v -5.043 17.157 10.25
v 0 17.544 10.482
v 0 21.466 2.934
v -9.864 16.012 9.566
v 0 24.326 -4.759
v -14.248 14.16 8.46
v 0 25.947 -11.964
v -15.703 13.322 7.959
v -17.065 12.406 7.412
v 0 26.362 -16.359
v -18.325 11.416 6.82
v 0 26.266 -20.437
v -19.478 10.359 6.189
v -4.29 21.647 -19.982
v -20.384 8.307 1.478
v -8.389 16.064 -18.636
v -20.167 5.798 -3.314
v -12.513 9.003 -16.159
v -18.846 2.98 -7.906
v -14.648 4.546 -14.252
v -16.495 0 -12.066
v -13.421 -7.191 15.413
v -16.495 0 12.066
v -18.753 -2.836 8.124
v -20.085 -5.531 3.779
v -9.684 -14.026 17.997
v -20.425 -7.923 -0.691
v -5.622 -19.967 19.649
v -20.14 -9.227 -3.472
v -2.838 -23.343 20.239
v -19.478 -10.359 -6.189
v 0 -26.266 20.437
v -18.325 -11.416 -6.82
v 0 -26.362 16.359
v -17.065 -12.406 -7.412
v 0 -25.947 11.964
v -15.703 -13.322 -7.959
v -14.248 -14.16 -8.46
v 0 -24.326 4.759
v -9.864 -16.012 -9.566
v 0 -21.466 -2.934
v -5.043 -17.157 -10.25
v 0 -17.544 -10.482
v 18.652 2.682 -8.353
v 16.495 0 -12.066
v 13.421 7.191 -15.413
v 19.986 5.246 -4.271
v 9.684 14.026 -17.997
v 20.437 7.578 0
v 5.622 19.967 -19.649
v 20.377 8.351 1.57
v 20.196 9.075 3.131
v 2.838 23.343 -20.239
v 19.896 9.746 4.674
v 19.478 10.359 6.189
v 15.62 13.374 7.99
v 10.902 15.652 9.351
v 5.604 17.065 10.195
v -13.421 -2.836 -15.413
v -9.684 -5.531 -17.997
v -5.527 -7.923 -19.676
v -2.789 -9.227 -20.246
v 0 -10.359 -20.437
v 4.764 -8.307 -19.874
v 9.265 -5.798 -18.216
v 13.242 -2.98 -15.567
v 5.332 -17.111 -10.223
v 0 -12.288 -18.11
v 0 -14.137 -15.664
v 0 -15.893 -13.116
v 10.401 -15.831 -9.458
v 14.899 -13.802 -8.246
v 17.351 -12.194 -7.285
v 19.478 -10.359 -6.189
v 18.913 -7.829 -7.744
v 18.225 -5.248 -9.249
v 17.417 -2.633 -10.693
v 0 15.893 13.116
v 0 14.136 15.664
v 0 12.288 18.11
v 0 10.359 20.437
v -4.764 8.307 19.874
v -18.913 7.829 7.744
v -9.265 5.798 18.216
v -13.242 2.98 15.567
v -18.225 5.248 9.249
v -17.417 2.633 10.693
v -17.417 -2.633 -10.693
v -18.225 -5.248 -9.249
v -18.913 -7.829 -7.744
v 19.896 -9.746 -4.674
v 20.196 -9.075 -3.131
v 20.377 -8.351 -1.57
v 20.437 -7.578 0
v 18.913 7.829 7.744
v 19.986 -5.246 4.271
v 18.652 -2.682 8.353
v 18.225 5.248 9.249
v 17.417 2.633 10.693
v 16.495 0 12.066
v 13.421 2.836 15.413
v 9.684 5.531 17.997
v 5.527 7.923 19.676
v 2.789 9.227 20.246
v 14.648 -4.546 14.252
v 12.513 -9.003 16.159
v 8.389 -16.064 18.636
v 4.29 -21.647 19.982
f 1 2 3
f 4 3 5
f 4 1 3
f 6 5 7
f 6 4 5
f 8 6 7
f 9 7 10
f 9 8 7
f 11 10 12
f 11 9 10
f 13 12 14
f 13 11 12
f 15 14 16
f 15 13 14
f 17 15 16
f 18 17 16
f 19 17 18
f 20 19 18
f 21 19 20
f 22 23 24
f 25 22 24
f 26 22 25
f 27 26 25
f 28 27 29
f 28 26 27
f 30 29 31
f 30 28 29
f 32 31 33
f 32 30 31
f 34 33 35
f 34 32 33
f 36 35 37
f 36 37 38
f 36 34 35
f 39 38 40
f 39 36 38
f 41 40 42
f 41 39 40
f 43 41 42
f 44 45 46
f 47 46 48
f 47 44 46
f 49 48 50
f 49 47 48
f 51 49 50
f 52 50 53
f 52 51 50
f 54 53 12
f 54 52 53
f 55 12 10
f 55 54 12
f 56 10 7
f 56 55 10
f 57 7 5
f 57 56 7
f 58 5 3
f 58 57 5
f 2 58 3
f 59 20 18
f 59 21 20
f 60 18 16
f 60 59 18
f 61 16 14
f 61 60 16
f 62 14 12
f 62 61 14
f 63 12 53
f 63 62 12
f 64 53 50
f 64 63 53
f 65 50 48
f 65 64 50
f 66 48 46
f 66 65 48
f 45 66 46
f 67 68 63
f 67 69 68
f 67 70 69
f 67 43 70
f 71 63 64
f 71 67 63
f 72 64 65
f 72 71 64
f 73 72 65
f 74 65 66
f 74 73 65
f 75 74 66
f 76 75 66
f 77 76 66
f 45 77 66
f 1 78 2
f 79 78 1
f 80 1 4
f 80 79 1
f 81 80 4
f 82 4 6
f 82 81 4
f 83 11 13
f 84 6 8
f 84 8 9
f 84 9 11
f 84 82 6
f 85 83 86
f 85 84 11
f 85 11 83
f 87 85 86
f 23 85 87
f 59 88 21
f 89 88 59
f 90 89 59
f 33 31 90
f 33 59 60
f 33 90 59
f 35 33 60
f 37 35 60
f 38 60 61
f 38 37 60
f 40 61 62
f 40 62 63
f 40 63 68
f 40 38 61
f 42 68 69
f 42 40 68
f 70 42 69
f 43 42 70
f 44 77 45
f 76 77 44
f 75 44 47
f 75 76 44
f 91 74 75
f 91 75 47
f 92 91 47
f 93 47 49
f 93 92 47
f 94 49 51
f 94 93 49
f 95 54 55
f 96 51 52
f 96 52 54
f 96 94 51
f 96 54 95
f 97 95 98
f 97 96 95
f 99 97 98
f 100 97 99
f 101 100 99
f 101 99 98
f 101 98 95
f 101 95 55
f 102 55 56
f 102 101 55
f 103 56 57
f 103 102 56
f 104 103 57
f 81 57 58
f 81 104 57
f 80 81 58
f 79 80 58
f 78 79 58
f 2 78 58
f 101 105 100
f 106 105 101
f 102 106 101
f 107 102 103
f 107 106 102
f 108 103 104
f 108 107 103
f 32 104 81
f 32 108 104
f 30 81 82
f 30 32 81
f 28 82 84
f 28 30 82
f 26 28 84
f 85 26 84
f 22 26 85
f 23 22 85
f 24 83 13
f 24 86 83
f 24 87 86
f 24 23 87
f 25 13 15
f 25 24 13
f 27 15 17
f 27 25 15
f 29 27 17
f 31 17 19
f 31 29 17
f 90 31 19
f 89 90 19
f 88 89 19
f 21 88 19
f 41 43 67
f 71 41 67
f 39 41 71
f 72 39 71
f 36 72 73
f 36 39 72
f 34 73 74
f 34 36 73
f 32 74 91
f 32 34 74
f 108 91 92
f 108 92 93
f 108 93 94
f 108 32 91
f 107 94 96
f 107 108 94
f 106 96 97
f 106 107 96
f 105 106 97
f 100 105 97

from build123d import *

# Parameters (mm, degrees)
F0_R     = 20.437105
F1_DEPTH = 40
F4_COUNT = 3


with BuildPart() as f1:
    # F0 (on Front) → F1 (new body, symmetric)
    with BuildSketch(Plane.XZ):
        Circle(F0_R)
    extrude(amount=F1_DEPTH, both=True)


with BuildPart() as f4_1:
    # F4: instance of F1
    add(f1.part.rotate(Axis((0, -14.142136, 11.003757), (0, -0.789235, 0.614091)), 1 * 360 / F4_COUNT))


with BuildPart() as f4_2:
    # F4: instance of F1
    add(f1.part.rotate(Axis((0, -14.142136, 11.003757), (0, -0.789235, 0.614091)), 2 * 360 / F4_COUNT))

    # F5: intersect F4_1, F1
    add(f4_1.part, mode=Mode.INTERSECT)
    add(f1.part, mode=Mode.INTERSECT)


solid = f4_2.part
